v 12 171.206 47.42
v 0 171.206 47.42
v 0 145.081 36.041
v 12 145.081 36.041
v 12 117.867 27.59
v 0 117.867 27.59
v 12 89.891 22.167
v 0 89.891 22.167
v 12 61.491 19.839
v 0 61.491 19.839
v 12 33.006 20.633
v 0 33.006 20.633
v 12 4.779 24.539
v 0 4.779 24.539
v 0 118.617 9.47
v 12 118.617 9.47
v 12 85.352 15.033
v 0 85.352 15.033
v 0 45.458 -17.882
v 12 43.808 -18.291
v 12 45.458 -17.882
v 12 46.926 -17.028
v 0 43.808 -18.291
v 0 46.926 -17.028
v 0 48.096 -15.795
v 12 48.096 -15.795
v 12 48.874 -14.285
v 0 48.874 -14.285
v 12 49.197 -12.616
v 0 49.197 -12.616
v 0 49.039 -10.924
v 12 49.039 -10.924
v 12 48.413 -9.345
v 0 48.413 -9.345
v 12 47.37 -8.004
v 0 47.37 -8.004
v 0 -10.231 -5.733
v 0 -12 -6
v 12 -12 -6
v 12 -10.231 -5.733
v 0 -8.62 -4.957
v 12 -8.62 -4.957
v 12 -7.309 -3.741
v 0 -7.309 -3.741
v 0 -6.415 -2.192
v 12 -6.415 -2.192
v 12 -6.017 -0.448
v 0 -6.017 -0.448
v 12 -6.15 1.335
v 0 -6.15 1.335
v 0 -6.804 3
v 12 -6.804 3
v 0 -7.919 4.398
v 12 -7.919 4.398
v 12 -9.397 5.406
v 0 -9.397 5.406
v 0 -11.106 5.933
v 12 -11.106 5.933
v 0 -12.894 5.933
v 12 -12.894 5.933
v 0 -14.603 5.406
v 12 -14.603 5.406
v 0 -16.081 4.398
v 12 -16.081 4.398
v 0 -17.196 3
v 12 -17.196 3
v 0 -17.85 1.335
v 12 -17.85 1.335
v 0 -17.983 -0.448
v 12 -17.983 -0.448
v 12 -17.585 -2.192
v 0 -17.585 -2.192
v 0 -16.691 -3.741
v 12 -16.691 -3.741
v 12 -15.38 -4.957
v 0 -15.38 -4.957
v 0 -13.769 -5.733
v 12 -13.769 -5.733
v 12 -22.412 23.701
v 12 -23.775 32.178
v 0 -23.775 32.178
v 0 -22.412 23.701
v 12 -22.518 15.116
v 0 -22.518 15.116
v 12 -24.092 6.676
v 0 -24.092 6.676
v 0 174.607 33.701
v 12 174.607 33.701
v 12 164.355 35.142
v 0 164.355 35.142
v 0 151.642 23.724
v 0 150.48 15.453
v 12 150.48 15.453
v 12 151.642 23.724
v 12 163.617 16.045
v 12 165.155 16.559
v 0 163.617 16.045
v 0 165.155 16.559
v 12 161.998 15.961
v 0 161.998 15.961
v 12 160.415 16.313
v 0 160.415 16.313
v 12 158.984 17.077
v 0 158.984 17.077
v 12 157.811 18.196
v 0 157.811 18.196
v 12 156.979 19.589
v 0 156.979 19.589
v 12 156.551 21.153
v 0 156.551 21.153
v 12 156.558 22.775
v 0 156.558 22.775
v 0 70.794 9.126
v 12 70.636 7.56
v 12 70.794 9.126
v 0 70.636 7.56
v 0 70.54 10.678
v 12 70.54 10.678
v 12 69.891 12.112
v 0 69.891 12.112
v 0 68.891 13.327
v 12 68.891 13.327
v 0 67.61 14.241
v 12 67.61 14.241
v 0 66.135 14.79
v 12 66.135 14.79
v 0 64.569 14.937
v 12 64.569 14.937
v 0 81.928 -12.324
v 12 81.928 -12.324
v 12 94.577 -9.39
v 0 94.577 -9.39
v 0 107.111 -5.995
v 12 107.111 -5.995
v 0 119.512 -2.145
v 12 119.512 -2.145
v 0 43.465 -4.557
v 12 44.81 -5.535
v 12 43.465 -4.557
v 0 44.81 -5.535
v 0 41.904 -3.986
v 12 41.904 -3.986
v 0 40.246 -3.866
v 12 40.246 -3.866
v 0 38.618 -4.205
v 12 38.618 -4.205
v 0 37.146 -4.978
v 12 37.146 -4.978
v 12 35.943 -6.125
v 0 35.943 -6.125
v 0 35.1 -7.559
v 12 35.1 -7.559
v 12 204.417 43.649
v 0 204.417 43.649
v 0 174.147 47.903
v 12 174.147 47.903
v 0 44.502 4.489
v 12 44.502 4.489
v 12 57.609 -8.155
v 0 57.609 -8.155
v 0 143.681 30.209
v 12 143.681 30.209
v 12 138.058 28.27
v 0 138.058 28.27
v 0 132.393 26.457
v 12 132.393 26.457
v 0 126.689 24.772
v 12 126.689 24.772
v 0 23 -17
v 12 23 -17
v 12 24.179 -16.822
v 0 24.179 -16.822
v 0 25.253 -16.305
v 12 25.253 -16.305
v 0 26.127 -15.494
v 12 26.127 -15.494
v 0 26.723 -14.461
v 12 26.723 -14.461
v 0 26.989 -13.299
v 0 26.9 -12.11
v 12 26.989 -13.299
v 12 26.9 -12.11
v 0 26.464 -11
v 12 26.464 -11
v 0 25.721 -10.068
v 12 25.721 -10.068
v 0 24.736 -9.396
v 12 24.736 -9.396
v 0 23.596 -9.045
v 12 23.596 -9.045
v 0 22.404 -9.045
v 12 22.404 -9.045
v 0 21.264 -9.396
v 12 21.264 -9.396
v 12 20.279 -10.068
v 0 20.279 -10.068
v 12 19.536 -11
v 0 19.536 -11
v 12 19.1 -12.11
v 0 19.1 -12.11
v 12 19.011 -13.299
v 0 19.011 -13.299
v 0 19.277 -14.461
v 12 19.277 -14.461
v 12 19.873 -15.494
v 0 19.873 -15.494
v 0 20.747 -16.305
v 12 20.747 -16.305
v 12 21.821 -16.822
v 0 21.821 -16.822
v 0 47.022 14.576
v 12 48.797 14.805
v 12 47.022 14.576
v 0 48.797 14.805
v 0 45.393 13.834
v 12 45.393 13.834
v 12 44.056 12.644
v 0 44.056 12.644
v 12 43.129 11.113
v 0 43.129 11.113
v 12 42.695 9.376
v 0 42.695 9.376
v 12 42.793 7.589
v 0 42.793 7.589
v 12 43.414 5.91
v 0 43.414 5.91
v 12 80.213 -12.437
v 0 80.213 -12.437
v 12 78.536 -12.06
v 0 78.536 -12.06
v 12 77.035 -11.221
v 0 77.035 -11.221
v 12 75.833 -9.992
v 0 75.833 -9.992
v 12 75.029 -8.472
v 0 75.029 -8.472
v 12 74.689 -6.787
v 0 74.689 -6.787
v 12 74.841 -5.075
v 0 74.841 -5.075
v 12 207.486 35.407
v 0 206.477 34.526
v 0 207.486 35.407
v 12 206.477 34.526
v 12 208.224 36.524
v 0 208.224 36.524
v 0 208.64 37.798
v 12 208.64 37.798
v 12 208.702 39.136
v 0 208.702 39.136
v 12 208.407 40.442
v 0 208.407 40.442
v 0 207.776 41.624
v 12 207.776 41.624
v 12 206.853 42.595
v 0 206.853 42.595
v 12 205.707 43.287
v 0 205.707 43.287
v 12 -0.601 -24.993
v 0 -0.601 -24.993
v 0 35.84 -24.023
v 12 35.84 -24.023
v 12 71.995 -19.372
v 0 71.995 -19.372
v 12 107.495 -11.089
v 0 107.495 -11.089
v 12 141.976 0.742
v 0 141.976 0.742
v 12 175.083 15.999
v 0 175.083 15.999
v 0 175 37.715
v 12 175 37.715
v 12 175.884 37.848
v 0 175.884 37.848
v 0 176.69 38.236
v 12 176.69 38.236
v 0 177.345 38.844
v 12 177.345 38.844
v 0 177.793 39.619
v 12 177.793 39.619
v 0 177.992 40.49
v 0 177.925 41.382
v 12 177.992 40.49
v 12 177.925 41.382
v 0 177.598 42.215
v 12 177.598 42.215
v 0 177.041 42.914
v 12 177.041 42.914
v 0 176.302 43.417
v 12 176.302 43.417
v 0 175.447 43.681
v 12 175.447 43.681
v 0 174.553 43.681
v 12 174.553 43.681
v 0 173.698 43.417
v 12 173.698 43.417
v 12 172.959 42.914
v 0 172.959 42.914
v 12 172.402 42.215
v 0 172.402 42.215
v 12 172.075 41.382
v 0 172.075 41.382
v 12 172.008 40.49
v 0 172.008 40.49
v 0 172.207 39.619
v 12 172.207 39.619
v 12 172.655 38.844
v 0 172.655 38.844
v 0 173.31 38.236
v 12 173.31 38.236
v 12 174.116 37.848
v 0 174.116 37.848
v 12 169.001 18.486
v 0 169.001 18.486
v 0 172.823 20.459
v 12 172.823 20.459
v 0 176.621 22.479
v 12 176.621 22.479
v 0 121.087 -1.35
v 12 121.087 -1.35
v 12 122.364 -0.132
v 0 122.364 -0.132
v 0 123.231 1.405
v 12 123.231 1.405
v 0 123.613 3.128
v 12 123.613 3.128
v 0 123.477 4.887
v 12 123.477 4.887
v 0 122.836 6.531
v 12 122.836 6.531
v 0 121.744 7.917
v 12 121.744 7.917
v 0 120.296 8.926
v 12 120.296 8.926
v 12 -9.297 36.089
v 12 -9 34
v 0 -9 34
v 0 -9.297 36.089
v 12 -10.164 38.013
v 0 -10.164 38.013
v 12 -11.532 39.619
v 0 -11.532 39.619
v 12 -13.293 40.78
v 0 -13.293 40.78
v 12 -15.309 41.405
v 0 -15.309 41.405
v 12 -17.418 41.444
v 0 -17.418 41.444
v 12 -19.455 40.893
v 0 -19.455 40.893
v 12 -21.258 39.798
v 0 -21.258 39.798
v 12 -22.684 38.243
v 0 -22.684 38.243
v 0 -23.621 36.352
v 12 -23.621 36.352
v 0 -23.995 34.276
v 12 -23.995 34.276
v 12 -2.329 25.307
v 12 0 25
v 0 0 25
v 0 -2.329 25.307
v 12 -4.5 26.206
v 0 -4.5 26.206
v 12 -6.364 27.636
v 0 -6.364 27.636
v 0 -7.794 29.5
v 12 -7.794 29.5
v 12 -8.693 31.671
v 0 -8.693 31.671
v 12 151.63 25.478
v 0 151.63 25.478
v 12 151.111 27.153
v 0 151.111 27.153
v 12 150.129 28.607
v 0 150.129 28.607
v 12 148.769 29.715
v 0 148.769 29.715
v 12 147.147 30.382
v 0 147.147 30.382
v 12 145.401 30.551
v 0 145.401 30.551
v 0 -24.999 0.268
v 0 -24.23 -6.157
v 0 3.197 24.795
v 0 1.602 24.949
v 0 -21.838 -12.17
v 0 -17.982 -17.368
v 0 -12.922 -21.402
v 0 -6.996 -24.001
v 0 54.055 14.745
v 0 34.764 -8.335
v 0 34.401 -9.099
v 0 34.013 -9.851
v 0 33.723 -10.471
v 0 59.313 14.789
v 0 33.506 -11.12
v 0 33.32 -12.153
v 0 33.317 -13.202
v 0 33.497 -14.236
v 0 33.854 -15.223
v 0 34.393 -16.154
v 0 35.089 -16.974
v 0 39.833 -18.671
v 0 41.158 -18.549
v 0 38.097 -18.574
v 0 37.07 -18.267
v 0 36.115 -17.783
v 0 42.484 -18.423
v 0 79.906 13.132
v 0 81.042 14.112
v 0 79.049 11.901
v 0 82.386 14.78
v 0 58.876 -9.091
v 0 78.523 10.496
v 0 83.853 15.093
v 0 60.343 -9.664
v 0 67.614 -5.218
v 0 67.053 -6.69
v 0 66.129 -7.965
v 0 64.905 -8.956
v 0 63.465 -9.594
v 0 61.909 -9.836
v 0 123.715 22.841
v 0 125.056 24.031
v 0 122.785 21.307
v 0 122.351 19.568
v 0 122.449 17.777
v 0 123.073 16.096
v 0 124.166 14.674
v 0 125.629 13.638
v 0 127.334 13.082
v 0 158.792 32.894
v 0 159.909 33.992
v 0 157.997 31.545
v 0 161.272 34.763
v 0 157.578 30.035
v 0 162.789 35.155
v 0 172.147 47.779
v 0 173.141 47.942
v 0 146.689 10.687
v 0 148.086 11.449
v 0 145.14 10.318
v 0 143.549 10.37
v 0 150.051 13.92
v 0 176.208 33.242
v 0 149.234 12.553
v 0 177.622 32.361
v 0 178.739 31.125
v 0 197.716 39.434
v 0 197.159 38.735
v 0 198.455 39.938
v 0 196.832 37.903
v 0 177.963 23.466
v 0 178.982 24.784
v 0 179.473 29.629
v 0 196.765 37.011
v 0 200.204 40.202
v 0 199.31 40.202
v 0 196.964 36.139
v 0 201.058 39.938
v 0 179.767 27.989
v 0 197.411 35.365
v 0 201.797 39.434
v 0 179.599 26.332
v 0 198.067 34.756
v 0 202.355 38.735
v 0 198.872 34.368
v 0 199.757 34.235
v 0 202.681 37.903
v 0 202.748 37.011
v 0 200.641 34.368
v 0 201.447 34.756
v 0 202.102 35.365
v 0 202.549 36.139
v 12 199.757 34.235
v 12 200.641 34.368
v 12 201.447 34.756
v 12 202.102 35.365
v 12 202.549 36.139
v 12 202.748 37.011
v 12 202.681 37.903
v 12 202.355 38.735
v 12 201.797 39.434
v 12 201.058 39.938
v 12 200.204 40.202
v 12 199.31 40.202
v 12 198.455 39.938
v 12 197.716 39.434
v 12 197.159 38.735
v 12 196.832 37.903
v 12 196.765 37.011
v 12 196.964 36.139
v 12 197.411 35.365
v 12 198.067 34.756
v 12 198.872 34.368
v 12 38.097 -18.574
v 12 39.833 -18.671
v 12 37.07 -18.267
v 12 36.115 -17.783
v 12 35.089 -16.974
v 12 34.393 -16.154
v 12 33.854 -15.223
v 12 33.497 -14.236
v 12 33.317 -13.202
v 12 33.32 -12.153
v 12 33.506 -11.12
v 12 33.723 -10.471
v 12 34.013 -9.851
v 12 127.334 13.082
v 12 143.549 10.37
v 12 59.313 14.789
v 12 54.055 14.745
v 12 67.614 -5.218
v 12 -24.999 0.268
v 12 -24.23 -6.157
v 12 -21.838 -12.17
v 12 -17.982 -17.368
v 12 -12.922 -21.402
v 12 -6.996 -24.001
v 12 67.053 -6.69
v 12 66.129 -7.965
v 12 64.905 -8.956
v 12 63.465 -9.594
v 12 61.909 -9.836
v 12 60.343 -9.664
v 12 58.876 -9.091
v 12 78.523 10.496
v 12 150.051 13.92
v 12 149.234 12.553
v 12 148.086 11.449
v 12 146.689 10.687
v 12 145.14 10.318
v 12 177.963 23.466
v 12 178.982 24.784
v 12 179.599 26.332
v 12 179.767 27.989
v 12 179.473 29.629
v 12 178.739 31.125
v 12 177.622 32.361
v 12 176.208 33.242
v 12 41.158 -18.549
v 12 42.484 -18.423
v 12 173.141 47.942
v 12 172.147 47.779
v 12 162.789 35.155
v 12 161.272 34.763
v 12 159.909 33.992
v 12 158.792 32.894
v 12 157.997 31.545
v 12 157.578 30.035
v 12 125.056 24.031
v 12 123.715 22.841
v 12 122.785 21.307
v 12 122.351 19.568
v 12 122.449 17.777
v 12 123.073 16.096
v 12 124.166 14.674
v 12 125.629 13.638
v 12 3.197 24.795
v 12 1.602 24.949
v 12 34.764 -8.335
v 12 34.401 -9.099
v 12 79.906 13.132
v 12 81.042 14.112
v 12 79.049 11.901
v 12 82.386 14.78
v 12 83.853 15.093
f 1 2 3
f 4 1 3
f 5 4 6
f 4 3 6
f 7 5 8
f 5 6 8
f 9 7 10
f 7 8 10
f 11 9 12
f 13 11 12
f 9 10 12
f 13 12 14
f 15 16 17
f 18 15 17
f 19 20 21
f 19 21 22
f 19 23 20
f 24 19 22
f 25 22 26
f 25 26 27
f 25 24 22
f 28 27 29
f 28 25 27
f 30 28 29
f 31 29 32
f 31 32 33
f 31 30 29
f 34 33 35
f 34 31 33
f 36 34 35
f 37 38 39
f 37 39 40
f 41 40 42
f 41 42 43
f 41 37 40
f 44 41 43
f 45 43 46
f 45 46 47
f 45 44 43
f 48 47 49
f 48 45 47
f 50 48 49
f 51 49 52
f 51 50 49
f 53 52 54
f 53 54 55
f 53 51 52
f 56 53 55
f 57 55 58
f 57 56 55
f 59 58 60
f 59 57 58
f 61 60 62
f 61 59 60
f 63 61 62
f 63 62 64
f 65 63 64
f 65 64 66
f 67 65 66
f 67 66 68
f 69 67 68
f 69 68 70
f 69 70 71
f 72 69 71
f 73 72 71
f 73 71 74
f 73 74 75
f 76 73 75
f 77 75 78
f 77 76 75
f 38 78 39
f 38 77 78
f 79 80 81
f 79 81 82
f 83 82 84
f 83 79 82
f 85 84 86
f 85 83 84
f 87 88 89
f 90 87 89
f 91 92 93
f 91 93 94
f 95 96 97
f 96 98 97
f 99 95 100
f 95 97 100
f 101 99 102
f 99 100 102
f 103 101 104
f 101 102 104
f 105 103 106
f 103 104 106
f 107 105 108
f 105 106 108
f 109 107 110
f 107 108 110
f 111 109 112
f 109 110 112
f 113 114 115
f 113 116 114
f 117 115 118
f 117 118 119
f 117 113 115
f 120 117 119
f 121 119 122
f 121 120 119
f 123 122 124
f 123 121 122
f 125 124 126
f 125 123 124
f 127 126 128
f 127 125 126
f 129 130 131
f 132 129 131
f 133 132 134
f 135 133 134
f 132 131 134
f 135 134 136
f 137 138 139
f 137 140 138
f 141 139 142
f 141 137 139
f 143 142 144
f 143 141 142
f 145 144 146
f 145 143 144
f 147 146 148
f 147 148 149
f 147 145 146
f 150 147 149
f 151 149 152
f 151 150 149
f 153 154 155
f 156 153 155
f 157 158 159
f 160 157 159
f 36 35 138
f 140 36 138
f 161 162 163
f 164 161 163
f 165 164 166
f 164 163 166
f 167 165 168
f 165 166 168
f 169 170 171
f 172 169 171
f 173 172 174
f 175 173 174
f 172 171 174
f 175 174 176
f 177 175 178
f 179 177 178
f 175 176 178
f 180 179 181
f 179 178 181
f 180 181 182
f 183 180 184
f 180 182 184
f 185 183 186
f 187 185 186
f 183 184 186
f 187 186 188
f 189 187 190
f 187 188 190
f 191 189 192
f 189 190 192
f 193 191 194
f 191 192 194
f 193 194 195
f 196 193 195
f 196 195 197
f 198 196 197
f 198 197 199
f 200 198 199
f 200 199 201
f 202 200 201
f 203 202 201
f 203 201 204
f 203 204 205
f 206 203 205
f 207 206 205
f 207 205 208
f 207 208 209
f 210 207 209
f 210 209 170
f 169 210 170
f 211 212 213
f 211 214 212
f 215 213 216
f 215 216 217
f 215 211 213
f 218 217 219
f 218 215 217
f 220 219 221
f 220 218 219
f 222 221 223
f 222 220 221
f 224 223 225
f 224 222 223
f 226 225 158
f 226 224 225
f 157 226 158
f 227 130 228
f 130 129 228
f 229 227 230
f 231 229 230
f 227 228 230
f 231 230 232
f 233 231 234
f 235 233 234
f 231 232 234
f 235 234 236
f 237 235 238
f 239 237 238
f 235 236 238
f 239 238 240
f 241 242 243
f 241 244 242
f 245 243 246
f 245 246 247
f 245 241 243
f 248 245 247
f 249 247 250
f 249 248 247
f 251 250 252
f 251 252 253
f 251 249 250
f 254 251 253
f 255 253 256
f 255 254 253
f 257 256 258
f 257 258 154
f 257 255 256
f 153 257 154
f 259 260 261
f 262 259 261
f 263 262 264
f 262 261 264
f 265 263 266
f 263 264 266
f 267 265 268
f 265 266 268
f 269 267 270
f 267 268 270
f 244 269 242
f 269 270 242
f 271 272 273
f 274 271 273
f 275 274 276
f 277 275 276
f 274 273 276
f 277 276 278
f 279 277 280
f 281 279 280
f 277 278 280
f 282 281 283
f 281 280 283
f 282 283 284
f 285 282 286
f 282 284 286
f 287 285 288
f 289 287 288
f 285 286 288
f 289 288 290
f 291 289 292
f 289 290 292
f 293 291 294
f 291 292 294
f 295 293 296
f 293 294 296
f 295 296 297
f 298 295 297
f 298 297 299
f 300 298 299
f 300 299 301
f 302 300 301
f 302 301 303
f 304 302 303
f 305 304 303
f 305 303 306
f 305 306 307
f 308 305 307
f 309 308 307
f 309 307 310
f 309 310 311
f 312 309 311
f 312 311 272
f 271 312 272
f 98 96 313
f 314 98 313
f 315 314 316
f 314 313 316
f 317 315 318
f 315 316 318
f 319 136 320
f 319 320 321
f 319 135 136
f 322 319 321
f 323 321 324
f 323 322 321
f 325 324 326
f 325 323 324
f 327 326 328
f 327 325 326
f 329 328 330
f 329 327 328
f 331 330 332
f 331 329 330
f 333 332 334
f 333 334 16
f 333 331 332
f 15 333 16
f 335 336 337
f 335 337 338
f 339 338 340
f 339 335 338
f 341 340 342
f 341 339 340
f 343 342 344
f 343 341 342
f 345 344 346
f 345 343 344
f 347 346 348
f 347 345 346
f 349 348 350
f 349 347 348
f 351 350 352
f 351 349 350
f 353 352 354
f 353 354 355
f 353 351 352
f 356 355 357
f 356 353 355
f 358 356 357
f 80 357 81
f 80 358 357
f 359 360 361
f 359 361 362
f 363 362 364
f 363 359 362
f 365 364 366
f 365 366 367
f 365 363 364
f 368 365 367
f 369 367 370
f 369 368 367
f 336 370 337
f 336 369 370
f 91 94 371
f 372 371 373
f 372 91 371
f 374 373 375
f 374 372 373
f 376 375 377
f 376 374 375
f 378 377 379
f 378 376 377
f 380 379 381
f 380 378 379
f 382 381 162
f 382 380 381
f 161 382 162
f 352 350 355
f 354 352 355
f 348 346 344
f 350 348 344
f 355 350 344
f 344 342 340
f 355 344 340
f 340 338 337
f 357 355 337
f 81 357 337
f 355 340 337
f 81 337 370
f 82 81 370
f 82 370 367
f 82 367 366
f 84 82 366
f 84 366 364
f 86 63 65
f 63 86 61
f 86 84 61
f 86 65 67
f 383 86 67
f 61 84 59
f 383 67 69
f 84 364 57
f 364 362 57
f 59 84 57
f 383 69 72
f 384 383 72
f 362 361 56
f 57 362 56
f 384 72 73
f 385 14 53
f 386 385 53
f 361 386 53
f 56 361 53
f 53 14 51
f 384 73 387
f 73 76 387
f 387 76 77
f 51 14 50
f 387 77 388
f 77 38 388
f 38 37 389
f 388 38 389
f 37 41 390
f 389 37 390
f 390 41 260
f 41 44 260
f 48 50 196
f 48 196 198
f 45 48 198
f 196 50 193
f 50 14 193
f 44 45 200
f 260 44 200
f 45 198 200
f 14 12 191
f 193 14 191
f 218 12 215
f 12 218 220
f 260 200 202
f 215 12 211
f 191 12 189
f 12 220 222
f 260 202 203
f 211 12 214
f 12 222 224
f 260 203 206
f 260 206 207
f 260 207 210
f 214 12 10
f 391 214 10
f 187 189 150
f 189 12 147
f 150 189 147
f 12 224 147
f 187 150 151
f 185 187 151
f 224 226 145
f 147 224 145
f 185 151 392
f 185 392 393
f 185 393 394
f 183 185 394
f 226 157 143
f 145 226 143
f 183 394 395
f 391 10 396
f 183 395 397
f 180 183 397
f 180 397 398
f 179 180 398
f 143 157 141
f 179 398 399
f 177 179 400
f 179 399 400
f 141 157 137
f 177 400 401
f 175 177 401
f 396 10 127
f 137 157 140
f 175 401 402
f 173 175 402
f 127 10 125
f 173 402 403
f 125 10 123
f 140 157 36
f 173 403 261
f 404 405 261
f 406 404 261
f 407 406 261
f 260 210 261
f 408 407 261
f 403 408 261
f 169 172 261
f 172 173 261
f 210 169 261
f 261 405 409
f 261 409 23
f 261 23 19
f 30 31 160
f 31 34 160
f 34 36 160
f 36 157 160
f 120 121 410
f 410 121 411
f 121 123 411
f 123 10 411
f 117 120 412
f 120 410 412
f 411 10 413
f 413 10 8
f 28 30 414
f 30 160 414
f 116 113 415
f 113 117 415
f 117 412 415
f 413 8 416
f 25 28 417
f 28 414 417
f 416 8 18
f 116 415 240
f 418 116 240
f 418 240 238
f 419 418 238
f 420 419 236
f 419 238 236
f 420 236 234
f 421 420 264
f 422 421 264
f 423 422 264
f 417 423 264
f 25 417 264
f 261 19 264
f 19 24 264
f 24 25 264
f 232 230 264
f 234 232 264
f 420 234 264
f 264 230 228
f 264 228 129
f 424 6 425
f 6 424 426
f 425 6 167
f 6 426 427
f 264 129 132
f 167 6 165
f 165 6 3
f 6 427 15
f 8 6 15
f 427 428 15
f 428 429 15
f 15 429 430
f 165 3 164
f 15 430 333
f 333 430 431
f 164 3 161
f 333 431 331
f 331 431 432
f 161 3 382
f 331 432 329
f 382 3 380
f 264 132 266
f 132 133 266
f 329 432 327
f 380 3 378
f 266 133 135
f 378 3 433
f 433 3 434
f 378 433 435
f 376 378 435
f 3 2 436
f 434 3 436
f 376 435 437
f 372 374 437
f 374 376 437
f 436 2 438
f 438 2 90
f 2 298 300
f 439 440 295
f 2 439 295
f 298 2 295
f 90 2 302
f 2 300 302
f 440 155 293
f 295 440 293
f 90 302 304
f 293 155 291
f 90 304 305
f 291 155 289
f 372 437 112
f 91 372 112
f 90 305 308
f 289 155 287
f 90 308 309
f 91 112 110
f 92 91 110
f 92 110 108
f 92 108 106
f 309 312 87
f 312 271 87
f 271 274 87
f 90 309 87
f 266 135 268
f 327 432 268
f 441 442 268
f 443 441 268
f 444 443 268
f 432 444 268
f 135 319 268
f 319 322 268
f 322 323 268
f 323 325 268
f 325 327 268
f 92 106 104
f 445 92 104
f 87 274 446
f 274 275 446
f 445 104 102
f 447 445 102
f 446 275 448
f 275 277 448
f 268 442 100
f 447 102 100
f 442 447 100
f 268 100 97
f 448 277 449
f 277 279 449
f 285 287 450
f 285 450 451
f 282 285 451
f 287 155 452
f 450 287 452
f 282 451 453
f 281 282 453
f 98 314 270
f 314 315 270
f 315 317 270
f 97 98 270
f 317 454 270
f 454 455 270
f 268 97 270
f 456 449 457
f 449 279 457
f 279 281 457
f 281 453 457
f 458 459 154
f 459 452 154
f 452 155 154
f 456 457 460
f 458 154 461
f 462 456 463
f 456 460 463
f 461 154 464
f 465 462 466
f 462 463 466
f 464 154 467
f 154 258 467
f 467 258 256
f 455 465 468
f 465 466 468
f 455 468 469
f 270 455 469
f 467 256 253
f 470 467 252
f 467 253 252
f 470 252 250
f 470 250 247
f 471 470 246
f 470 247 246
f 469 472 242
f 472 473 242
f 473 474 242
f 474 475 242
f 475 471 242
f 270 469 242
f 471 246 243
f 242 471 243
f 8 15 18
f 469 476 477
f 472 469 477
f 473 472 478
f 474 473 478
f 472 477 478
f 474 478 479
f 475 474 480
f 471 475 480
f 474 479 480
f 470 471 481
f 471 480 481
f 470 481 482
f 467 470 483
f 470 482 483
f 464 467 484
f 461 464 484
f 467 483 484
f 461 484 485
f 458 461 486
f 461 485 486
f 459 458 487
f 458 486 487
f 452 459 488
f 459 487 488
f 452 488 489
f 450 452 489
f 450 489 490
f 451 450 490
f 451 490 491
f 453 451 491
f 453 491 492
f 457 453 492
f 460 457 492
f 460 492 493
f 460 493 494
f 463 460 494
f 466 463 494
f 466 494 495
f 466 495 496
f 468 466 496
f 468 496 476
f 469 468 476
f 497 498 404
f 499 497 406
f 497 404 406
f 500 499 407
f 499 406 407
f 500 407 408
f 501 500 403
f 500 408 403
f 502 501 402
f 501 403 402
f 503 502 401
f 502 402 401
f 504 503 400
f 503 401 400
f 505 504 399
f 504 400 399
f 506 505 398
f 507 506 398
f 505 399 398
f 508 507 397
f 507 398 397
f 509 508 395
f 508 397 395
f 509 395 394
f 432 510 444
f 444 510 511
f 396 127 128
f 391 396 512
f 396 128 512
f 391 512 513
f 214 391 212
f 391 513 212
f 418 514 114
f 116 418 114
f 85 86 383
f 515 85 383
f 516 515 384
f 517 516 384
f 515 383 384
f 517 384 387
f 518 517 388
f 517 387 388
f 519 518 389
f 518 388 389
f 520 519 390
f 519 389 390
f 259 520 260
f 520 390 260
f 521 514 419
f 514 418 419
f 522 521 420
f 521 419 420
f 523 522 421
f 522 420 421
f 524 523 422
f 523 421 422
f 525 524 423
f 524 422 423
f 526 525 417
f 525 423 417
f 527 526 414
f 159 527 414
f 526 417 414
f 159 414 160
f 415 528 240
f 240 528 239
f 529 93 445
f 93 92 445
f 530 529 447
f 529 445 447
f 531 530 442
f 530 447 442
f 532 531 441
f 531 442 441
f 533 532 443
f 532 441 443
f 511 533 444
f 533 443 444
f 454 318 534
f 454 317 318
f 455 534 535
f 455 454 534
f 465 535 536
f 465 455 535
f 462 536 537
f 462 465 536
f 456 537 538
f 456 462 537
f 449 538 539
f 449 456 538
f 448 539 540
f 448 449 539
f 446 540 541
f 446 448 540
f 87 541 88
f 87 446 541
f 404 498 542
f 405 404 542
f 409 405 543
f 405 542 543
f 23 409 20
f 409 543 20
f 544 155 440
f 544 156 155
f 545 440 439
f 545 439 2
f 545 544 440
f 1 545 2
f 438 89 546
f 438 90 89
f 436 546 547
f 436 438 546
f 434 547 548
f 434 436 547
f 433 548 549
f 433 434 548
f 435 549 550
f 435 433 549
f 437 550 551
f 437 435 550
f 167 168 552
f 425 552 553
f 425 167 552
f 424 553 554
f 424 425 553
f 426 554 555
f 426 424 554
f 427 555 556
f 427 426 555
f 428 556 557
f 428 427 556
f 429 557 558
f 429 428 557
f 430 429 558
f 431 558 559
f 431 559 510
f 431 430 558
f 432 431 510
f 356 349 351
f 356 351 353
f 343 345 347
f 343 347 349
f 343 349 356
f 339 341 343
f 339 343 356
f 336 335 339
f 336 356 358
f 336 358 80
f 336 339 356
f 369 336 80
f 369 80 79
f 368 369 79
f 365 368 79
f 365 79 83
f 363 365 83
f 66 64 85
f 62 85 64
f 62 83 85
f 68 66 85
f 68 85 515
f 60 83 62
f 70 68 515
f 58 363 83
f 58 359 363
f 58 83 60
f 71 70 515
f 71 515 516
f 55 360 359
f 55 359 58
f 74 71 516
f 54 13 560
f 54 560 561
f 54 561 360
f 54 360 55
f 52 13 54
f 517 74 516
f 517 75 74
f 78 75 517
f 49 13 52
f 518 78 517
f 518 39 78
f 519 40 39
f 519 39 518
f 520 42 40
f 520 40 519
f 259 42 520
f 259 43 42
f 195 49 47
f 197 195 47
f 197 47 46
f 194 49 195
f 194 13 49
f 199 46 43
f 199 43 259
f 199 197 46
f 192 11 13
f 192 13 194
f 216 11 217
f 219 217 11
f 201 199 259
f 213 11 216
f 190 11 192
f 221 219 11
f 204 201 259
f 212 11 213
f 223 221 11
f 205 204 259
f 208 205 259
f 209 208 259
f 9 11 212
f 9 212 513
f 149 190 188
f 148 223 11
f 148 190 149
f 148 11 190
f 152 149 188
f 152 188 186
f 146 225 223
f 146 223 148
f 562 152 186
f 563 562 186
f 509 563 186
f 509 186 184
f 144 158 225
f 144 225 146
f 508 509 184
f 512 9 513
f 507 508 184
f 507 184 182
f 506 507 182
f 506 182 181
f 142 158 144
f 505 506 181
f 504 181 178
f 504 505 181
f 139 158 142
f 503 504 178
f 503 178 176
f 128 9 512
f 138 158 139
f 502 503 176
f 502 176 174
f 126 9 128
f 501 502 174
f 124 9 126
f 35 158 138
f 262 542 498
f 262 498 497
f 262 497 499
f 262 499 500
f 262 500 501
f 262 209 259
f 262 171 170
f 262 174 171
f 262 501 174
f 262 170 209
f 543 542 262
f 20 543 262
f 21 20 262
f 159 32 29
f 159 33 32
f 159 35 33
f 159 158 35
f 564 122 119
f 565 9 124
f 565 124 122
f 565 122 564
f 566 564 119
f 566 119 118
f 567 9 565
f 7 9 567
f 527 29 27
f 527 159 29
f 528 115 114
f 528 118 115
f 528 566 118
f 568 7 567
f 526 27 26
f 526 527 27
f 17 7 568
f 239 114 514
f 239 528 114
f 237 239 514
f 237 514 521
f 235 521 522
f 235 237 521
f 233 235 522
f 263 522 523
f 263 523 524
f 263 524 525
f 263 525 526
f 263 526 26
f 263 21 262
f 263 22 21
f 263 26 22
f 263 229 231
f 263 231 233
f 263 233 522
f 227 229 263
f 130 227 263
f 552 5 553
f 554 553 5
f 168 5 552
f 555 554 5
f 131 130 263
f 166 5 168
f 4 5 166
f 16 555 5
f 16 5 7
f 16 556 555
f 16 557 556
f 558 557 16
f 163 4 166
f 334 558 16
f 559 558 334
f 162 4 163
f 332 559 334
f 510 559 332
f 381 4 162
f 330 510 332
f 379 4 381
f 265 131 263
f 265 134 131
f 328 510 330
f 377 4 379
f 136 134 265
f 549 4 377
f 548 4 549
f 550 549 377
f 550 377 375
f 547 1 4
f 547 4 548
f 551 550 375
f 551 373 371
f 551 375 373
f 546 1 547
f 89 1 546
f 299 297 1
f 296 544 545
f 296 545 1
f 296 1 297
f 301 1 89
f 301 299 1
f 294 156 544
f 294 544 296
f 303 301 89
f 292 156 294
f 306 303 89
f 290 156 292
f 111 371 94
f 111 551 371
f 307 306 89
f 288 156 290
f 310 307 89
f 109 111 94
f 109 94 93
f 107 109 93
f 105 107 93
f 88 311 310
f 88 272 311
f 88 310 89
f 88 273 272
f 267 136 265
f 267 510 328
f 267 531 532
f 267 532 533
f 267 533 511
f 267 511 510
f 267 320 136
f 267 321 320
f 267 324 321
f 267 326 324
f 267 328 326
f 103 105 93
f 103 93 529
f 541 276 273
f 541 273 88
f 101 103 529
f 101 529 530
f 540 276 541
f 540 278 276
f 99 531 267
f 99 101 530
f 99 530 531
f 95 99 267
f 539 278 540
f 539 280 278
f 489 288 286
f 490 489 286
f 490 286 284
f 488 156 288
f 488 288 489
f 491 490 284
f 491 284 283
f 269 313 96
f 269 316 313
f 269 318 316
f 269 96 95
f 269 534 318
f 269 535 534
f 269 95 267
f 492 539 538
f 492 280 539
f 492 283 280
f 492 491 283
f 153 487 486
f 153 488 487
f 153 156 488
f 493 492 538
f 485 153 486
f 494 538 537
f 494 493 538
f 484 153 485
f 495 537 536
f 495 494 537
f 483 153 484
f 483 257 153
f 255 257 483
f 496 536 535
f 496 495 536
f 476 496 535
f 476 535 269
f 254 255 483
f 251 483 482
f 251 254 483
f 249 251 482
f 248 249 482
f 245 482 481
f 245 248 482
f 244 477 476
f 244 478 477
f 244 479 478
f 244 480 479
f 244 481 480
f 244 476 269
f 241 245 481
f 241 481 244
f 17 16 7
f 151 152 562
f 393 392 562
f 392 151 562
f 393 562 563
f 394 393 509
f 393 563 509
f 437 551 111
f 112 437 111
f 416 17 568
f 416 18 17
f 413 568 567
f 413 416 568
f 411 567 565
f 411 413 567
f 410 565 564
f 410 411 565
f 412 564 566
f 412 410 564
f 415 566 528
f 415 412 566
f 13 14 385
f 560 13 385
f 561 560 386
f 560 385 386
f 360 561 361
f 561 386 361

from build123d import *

# Parameters (mm, degrees)
SKETCH1_R           = 6
BOSS_EXTRUDE1_DEPTH = 12
SKETCH3_R           = 3
CUT_EXTRUDE2_DEPTH  = 13
CUT_EXTRUDE3_DEPTH  = 13
FILLET1_R           = 6
SKETCH2_R           = 4
CUT_EXTRUDE1_DEPTH  = 13.0000001
SKETCH5_R           = 7.5
BOSS_EXTRUDE2_DEPTH = 12
FILLET2_R           = 5


with BuildPart() as part:
    # Sketch1 → Boss-Extrude1 (new body)
    with BuildSketch(Plane(origin=(0, 0, 0), x_dir=(0, 0, -1), z_dir=(1, 0, 0))):
        with BuildLine():
            ThreePointArc((24.992781164, -0.60074095), (9.243822678, 113.703988064), (-41.858816097, 217.155044504))
            Line((-41.858816097, 217.155044504), (-48.12160564, 172.59298141))
            ThreePointArc((-48.12160564, 172.59298141), (-22.274376436, 90.661190514), (-24.538993202, 4.778892408))
            ThreePointArc((-24.538993202, 4.778892408), (2.400538477, 24.88448141), (25, 0))
            ThreePointArc((25, 0), (24.998195226, -0.30039216), (24.992781164, -0.60074095))
        make_face()
        with BuildLine():
            ThreePointArc((-24.538993202, 4.778892408), (-2.699369305, -24.853840857), (24.992781164, -0.60074095))
            ThreePointArc((24.992781164, -0.60074095), (24.998195226, -0.30039216), (25, 0))
            ThreePointArc((25, 0), (2.400538477, 24.88448141), (-24.538993202, 4.778892408))
        make_face()
        with Locations((0, -12)):
            Circle(SKETCH1_R, mode=Mode.SUBTRACT)
    extrude(amount=BOSS_EXTRUDE1_DEPTH)

    # Sketch3 → Cut-Extrude2 (cut, through all)
    with BuildSketch(Plane(origin=(12, 0, 0), x_dir=(0, 0, -1), z_dir=(1, 0, 0))):
        with Locations((-40.714528231, 175)):
            Circle(SKETCH3_R)
        with Locations((-37.235200707, 199.756701719)):
            Circle(SKETCH3_R)
    extrude(amount=-CUT_EXTRUDE2_DEPTH, mode=Mode.SUBTRACT)

    # Sketch4 → Cut-Extrude3 (cut, through all)
    with BuildSketch(Plane(origin=(12, 0, 0), x_dir=(0, 0, -1), z_dir=(1, 0, 0))):
        with BuildLine():
            ThreePointArc((-11.749836025, 155.008629259), (-20.960958666, 173.77628952), (-31.260870979, 191.969190837))
            Line((-31.260870979, 191.969190837), (-35.976814508, 158.413509038))
            Line((-35.976814508, 158.413509038), (-11.749836025, 155.008629259))
        make_face()
        with BuildLine():
            Line((-9.354323007, 149.622823998), (-33.760235475, 153.052851308))
            ThreePointArc((-33.760235475, 153.052851308), (-24.416431689, 125.419954523), (-18.166319592, 96.927503721))
            Line((-18.166319592, 96.927503721), (-9.354323007, 149.622823998))
        make_face()
        with BuildLine():
            ThreePointArc((14.161868129, 72.691486719), (5.930300275, 107.334766496), (-5.730334656, 140.979158838))
            Line((-5.730334656, 140.979158838), (-15.958464631, 79.815428272))
            Line((-15.958464631, 79.815428272), (14.161868129, 72.691486719))
        make_face()
        with BuildLine():
            Line((15.468075791, 65.189422352), (-15.356589243, 72.479949778))
            ThreePointArc((-15.356589243, 72.479949778), (-14.750380465, 52.717361117), (-15.619336812, 32.964581198))
            Line((-15.619336812, 32.964581198), (15.468075791, 65.189422352))
        make_face()
        with BuildLine():
            ThreePointArc((19.721068997, 24.377203305), (18.614609922, 40.455333735), (16.779570125, 56.466678425))
            Line((16.779570125, 56.466678425), (-2, 37))
            ThreePointArc((-2, 37), (10.561248293, 33.615157675), (19.721068997, 24.377203305))
        make_face()
    extrude(amount=-CUT_EXTRUDE3_DEPTH, mode=Mode.SUBTRACT)

    # Fillet1
    fillet1_edges = [part.edges().sort_by_distance(p)[0] for p in [
        (6, 155.008629259, 11.749836025),
        (6, 158.413509038, 35.976814508),
        (6, 191.969190837, 31.260870979),
        (6, 96.927503721, 18.166319592),
        (6, 153.052851308, 33.760235475),
        (6, 149.622823998, 9.354323007),
        (6, 72.691486719, -14.161868129),
        (6, 79.815428272, 15.958464631),
        (6, 140.979158838, 5.730334656),
        (6, 32.964581198, 15.619336812),
        (6, 72.479949778, 15.356589243),
        (6, 65.189422352, -15.468075791),
        (6, 24.377203305, -19.721068997),
        (6, 37, 2),
        (6, 56.466678425, -16.779570125),
    ]]
    fillet(fillet1_edges, radius=FILLET1_R)

    # Sketch2 → Cut-Extrude1 (cut, through all)
    with BuildSketch(Plane(origin=(12, 0, 0), x_dir=(0, 0, -1), z_dir=(1, 0, 0))):
        with Locations((13, 23)):
            Circle(SKETCH2_R)
    extrude(amount=-CUT_EXTRUDE1_DEPTH, mode=Mode.SUBTRACT)

    # Sketch5 → Boss-Extrude2 (add)
    with BuildSketch(Plane(origin=(12, 0, 0), x_dir=(0, 0, -1), z_dir=(1, 0, 0))):
        with BuildLine():
            ThreePointArc((-34, -9), (-28.696699141, -11.196699141), (-26.5, -16.5))
            ThreePointArc((-26.5, -16.5), (-28.087357429, -21.114180081), (-32.177508753, -23.775199355))
            ThreePointArc((-32.177508753, -23.775199355), (-19.40613231, -22.280390349), (-6.675855702, -24.092176129))
            ThreePointArc((-6.675855702, -24.092176129), (-19.898447082, -15.134457497), (-25, 0))
            ThreePointArc((-25, 0), (-27.636038969, -6.363961031), (-34, -9))
        make_face()
        with Locations((-34, -16.5)):
            Circle(SKETCH5_R)
    extrude(amount=-BOSS_EXTRUDE2_DEPTH)

    # Fillet2
    fillet2_edges = [part.edges().sort_by_distance(p)[0] for p in [
        (6, 172.59298141, 48.12160564),
        (6, 217.155044504, 41.858816097),
    ]]
    fillet(fillet2_edges, radius=FILLET2_R)


solid = part.part
